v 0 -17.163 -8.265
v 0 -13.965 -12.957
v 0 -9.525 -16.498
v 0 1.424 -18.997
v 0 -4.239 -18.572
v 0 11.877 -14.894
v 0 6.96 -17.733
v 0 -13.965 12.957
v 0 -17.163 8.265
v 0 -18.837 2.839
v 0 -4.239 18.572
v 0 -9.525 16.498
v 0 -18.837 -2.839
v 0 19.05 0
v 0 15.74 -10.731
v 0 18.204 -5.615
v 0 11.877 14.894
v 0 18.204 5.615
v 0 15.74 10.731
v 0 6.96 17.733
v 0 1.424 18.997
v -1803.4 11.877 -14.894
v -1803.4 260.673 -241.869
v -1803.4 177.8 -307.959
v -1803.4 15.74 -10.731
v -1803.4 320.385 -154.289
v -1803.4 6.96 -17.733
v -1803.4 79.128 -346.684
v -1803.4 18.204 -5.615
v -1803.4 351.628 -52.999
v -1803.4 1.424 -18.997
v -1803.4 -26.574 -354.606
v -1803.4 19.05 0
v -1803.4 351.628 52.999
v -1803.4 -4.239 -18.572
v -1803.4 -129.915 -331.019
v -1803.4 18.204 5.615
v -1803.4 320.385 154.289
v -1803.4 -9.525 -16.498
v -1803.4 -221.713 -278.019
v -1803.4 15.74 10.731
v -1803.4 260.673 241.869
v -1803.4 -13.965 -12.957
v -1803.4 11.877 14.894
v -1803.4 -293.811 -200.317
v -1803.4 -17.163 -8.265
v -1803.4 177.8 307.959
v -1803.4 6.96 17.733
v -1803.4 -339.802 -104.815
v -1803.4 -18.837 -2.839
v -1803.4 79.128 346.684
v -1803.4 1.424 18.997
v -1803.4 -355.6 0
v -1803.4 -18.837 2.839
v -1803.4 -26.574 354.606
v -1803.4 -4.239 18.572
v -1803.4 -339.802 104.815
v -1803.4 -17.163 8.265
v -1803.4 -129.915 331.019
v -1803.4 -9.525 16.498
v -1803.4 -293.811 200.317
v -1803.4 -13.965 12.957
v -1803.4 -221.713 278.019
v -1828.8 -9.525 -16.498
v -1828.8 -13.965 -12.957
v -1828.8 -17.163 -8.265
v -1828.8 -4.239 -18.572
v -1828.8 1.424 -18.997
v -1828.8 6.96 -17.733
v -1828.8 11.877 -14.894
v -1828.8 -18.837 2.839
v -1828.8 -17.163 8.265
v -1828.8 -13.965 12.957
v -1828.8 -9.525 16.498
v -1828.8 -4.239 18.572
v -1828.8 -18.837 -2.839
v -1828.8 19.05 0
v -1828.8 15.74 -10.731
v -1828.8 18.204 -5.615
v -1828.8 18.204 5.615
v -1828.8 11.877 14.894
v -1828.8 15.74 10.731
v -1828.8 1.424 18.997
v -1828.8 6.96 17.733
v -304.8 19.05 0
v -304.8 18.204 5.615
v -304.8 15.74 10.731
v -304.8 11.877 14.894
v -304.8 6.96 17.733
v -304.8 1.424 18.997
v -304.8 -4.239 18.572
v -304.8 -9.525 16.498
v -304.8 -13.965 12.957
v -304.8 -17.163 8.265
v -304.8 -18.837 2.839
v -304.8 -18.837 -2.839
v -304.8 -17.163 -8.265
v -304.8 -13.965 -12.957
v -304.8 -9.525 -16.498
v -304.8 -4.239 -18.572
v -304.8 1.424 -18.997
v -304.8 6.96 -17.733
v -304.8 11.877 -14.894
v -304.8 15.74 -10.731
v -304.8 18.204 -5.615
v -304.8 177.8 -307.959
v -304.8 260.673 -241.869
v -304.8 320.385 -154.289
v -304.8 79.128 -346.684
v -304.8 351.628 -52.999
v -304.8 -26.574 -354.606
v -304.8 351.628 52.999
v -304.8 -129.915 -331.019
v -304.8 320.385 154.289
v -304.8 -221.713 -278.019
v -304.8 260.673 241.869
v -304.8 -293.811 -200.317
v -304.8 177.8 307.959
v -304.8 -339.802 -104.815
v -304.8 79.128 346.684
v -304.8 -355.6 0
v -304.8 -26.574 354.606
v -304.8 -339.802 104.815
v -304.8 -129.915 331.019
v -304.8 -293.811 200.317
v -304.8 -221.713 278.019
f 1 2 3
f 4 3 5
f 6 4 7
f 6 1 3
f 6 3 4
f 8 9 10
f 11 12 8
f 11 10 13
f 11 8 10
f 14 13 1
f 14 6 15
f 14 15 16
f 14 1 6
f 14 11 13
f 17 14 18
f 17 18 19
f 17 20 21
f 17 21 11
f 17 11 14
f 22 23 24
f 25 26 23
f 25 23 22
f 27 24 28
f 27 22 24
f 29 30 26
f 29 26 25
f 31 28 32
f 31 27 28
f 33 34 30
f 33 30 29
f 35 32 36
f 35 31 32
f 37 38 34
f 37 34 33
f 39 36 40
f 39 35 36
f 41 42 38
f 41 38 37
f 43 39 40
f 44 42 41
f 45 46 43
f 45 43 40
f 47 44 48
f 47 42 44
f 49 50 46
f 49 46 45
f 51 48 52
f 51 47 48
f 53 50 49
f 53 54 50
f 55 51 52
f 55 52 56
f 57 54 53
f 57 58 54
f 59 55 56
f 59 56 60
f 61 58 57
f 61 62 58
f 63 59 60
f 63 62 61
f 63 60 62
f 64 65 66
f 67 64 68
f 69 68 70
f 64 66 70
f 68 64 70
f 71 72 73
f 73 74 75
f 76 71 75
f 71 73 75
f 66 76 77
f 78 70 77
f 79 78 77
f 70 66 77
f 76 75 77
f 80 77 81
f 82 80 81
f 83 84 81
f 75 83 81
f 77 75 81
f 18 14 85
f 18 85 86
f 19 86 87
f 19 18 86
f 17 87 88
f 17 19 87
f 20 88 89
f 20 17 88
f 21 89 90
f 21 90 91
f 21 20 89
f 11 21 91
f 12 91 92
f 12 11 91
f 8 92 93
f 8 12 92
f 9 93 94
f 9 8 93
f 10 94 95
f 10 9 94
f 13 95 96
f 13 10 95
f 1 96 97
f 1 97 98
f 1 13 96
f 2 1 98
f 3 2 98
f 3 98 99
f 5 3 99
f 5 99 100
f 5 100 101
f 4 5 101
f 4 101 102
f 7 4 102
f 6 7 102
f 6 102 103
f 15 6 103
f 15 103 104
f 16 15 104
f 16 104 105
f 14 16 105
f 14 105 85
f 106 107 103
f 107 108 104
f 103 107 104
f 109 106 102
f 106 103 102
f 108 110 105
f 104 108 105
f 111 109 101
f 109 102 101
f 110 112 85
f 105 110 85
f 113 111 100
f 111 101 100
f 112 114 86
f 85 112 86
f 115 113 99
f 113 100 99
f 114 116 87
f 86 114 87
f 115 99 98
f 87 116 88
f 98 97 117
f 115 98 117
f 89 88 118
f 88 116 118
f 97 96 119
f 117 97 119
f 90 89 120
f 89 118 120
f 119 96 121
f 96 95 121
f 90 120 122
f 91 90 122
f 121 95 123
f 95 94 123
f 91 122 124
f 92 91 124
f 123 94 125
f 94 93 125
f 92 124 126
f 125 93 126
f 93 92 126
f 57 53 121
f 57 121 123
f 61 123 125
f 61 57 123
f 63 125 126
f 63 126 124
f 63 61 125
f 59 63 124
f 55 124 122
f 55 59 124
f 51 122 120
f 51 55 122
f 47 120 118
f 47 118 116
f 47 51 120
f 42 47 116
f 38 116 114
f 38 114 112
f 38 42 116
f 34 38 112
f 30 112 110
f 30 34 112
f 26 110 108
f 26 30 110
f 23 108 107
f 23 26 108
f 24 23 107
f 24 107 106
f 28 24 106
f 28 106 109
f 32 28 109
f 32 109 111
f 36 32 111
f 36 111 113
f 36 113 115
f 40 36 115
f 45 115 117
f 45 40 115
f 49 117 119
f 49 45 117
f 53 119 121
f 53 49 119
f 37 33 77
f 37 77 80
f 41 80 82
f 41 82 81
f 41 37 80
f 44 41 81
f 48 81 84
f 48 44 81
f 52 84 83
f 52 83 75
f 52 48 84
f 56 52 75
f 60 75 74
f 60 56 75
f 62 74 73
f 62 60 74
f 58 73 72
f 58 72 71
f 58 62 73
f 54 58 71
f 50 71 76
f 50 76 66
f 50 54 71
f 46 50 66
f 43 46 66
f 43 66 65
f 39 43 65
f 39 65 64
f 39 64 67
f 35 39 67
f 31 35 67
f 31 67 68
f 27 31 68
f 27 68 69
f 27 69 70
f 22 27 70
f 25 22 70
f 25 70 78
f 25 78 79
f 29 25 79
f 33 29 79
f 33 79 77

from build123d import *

# Parameters (mm, degrees)
F0_R     = 19.05
F1_DEPTH = 1828.8
F3_START = -25.4
F2_R     = 355.6
F3_DEPTH = 1498.6


with BuildPart() as f1:
    # F0 (on Right) → F1 (new body)
    with BuildSketch(Plane.YZ):
        Circle(F0_R)
    extrude(amount=-F1_DEPTH)

    # F2 (on face) → F3 (join)
    with BuildSketch(Plane(origin=(-1828.8, 0, 0), x_dir=(0, -1, 0), z_dir=(-1, 0, 0)).offset(F3_START)):
        Circle(F2_R)
    extrude(amount=-F3_DEPTH)


solid = f1.part
